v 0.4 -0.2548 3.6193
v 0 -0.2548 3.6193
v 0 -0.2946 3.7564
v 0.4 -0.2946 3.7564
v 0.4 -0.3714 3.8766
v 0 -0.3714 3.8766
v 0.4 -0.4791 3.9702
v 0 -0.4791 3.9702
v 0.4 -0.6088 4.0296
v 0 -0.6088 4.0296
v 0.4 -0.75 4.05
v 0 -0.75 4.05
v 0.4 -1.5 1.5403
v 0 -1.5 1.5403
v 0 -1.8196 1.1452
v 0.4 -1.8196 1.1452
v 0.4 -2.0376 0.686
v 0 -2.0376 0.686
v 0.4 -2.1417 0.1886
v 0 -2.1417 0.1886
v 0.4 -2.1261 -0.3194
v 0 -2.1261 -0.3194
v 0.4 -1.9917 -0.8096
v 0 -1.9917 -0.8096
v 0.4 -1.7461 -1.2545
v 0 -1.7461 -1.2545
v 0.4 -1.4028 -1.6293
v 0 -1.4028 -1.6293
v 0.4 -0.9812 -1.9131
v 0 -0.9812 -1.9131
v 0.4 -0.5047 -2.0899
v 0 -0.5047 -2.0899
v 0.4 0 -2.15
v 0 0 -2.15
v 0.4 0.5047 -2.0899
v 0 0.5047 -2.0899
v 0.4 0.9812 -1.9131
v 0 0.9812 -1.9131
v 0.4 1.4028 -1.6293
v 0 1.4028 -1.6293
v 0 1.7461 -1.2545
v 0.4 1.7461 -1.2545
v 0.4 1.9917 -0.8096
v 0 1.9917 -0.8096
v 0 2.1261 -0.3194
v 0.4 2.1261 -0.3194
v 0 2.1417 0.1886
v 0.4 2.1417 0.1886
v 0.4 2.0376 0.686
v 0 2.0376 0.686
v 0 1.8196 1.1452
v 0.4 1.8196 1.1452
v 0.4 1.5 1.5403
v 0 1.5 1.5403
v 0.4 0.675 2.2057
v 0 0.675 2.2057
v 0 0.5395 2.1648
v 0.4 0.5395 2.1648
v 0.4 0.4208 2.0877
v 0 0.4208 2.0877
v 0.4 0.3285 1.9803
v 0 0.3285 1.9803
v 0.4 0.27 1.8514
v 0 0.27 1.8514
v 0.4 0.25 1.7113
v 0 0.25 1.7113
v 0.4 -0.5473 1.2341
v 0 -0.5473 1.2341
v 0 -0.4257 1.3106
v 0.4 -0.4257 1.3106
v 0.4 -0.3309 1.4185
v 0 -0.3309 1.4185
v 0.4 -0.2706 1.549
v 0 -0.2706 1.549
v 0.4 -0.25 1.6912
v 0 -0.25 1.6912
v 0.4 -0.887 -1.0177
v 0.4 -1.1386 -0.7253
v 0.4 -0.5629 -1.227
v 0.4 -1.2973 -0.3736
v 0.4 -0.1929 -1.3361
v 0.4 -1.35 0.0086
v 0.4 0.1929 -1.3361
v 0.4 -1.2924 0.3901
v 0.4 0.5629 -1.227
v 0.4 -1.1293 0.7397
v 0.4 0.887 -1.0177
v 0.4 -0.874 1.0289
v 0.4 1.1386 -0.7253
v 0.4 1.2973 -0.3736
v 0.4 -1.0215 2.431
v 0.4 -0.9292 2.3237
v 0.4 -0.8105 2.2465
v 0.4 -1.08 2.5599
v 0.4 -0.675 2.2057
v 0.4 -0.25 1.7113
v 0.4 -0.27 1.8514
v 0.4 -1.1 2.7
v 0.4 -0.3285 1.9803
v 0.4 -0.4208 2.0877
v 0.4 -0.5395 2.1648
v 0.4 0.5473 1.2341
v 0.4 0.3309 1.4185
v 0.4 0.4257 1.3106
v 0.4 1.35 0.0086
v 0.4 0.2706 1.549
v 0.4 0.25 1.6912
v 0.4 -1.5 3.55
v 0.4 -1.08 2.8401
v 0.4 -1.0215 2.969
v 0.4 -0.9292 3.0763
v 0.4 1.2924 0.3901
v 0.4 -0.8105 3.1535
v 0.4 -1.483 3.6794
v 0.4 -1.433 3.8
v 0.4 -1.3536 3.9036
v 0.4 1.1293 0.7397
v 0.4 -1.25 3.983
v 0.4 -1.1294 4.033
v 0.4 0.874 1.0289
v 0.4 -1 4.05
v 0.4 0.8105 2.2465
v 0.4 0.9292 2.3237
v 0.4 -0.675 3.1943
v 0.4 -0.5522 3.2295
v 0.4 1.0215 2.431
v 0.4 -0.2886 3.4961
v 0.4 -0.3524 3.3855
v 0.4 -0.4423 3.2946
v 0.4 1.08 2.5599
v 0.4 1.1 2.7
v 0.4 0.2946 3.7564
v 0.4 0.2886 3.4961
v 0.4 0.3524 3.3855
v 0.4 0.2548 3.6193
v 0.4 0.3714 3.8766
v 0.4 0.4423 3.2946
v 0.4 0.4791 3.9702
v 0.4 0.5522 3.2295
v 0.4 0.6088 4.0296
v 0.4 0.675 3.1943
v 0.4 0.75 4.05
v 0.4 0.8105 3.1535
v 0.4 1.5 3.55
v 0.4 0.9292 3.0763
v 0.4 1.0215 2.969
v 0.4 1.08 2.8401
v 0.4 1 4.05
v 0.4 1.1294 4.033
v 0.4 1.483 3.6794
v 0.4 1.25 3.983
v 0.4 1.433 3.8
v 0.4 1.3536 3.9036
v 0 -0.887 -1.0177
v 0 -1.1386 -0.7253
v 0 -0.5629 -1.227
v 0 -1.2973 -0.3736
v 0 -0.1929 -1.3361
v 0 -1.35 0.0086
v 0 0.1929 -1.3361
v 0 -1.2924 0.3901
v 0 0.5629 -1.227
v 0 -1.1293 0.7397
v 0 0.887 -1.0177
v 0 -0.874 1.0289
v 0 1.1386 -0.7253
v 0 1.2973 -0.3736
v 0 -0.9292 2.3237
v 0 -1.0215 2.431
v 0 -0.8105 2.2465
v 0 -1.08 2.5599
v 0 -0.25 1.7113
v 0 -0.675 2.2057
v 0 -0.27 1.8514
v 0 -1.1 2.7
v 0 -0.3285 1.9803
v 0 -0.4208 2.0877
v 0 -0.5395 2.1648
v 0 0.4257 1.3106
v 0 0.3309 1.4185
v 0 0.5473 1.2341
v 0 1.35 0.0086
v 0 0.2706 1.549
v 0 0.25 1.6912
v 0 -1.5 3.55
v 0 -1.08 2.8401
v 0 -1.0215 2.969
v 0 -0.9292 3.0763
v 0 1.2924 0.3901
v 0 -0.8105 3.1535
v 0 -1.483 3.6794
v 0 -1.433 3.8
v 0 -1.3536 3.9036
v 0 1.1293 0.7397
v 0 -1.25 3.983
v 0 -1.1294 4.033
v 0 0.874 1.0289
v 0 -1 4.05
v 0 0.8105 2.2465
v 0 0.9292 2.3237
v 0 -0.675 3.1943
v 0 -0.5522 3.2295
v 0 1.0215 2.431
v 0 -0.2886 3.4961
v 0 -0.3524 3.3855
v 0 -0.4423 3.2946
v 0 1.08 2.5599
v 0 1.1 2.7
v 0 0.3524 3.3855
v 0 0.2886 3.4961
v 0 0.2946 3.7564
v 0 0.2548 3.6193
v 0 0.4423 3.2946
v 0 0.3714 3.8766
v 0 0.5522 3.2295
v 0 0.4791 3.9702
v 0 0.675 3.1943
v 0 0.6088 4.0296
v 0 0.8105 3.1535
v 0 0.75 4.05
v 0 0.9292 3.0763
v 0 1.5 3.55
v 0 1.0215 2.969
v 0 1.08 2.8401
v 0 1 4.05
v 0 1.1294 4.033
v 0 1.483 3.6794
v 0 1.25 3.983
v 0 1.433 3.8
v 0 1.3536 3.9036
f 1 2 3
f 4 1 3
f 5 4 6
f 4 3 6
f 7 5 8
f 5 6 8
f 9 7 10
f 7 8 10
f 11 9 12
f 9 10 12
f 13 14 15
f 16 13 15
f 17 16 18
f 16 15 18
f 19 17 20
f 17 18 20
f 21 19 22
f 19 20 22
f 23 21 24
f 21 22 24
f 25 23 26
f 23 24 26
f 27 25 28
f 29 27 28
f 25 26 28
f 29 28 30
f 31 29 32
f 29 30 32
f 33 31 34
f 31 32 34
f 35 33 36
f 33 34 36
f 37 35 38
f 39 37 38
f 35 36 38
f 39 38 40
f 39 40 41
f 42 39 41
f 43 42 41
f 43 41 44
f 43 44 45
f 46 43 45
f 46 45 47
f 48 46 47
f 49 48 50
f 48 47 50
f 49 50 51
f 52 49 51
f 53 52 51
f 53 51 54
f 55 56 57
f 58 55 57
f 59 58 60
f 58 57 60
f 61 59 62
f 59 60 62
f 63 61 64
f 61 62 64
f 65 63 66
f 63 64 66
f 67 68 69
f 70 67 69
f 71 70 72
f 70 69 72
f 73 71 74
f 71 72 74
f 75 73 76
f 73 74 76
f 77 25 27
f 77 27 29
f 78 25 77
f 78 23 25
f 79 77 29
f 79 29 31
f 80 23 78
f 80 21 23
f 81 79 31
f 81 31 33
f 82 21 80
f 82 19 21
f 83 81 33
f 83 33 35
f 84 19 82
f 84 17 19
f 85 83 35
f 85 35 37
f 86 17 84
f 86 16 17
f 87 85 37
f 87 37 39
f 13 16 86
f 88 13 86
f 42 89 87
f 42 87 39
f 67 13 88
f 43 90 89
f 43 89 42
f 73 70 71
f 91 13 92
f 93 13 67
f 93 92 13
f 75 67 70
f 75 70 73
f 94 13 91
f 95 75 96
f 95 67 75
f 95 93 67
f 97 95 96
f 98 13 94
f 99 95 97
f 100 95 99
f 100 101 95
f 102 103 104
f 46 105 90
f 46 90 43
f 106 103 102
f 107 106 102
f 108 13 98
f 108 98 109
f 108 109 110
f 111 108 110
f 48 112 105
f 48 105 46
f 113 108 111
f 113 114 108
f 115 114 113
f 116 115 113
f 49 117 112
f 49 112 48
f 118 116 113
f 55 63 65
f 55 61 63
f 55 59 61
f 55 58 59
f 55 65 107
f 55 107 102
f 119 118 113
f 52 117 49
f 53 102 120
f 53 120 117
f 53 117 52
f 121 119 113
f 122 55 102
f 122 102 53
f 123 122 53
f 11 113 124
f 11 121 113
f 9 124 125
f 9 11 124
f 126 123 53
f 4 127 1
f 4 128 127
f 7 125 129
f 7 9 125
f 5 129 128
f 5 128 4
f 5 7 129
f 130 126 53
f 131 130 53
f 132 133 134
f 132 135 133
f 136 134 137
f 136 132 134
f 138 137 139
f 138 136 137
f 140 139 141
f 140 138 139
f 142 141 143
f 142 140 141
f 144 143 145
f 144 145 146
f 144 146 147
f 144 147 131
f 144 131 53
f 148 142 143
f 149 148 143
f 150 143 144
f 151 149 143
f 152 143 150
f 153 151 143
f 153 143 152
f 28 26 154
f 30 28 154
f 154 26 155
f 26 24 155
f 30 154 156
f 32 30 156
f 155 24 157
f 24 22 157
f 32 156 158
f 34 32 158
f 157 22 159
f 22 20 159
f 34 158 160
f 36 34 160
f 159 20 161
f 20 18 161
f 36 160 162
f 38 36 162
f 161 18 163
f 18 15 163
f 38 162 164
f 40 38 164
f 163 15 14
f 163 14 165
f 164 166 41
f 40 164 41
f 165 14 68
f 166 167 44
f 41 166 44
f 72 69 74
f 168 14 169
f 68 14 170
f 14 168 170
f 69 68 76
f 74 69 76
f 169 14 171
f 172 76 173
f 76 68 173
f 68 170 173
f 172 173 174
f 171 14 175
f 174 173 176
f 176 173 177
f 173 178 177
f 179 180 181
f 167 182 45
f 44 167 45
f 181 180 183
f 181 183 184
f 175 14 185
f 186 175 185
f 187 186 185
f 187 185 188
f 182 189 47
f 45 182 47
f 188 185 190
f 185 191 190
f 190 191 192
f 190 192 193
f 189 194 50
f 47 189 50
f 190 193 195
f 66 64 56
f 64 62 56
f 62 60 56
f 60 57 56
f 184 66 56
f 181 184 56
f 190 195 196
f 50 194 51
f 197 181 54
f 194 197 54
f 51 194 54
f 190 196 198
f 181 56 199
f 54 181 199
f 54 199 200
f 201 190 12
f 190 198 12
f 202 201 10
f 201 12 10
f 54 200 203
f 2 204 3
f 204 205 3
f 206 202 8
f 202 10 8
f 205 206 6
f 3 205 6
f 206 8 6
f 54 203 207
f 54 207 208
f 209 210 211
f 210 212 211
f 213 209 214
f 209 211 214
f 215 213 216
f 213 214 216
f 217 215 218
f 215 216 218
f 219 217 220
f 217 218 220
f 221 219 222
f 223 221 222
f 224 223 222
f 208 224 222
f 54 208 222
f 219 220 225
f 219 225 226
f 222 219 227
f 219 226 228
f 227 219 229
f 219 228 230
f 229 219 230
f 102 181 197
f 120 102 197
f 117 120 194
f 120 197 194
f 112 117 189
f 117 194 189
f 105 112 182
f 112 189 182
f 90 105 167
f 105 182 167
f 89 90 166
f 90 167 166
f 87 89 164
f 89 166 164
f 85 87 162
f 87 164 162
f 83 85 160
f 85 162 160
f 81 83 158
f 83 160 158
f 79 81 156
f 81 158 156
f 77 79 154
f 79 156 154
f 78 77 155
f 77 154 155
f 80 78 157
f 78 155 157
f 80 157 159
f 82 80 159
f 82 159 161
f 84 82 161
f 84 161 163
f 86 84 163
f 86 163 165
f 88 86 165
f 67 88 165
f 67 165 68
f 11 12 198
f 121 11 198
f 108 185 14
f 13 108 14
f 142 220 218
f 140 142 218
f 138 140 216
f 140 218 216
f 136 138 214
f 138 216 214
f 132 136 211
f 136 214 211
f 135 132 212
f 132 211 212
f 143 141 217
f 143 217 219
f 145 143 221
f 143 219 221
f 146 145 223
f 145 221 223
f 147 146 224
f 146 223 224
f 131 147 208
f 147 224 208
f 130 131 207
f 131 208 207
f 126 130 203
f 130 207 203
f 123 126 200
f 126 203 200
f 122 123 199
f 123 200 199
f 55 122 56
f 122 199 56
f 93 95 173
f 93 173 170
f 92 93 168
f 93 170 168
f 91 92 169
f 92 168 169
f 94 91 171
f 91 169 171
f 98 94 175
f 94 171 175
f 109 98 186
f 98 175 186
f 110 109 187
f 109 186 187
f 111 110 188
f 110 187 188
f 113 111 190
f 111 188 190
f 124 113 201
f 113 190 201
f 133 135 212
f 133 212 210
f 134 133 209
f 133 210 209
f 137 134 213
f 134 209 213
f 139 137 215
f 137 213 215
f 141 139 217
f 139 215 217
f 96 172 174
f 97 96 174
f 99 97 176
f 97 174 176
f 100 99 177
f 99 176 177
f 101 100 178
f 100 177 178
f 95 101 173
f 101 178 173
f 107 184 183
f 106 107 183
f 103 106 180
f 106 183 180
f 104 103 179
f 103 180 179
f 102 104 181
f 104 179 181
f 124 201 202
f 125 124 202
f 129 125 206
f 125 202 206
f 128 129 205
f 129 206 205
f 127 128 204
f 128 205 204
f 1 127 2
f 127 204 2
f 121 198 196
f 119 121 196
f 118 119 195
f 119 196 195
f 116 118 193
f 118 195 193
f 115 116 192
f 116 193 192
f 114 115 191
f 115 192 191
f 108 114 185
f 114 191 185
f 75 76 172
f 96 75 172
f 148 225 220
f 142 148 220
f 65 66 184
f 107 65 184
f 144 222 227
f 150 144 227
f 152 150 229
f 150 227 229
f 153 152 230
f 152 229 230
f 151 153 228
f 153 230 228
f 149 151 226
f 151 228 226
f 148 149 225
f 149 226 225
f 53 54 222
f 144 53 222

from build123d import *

# Parameters (mm, degrees)
F1_DEPTH    = 0.4
F2_T1_DEPTH = 2.9
F2_T3_DEPTH = 2.8434299833
F2_T5_DEPTH = 2.2225176819


# Not quite as in the source:
# - a fillet or chamfer that OpenCascade refuses, or shapes differently, is made with other operations: its cross-section is extruded or revolved along the edge and cut away or added


with BuildPart() as f1:
    # F0 (on Right) → F1 (new body)
    with BuildSketch(Plane.YZ):
        with BuildLine():
            ThreePointArc((0.25, 1.3266499161), (0, -1.35), (-0.25, 1.3266499161))
            Line((-0.25, 1.3266499161), (-0.25, 2.2))
            Line((-0.25, 2.2), (-0.6, 2.2))
            ThreePointArc((-0.6, 2.2), (-1.1, 2.7), (-0.6, 3.2))
            Line((-0.6, 3.2), (-0.25, 3.2))
            Line((-0.25, 3.2), (-0.25, 4.05))
            Line((-0.25, 4.05), (-1.5, 4.05))
            Line((-1.5, 4.05), (-1.5, 1.5402921801))
            ThreePointArc((-1.5, 1.5402921801), (0, -2.15), (1.5, 1.5402921801))
            Line((1.5, 1.5402921801), (1.5, 4.05))
            Line((1.5, 4.05), (0.25, 4.05))
            Line((0.25, 4.05), (0.25, 3.2))
            Line((0.25, 3.2), (0.6, 3.2))
            ThreePointArc((0.6, 3.2), (1.1, 2.7), (0.6, 2.2))
            Line((0.6, 2.2), (0.25, 2.2))
            Line((0.25, 2.2), (0.25, 1.3266499161))
        make_face()
    extrude(amount=F1_DEPTH)

    # F2: fillet of radius 0.5 on 10 edges, made by hand

    # F2_s2 → F2_t1 (cut)
    with BuildSketch(Plane.YZ.offset(-1.25)):
        with BuildLine():
            ThreePointArc((-0.25, 3.55), (-0.3964466094, 3.9035533906), (-0.75, 4.05))
            Line((-0.75, 4.05), (-0.25, 4.05))
            Line((-0.25, 4.05), (-0.25, 3.55))
        make_face()
        with BuildLine():
            ThreePointArc((-1, 4.05), (-1.3535533906, 3.9035533906), (-1.5, 3.55))
            Line((-1.5, 3.55), (-1.5, 4.05))
            Line((-1.5, 4.05), (-1, 4.05))
        make_face()
        with BuildLine():
            ThreePointArc((0.75, 4.05), (0.3964466094, 3.9035533906), (0.25, 3.55))
            Line((0.25, 3.55), (0.25, 4.05))
            Line((0.25, 4.05), (0.75, 4.05))
        make_face()
        with BuildLine():
            ThreePointArc((1.5, 3.55), (1.3535533906, 3.9035533906), (1, 4.05))
            Line((1, 4.05), (1.5, 4.05))
            Line((1.5, 4.05), (1.5, 3.55))
        make_face()
    extrude(amount=F2_T1_DEPTH, mode=Mode.SUBTRACT)

    # F2_s4 → F2_t3 (cut)
    with BuildSketch(Plane.YZ.offset(-1.2217149917)):
        with BuildLine():
            ThreePointArc((-0.675, 3.1943429983), (-0.3708562278, 3.3627258764), (-0.25, 3.6886859967))
            Line((-0.25, 3.6886859967), (-0.2, 3.6886859967))
            Line((-0.2, 3.6886859967), (-0.2, 3.2))
            Line((-0.2, 3.2), (-0.25, 3.15))
            ThreePointArc((-0.25, 3.15), (-0.6, 3.15), (-0.6675, 3.1449086985))
            Line((-0.6675, 3.1449086985), (-0.675, 3.1943429983))
        make_face()
        with BuildLine():
            ThreePointArc((-0.25, 1.7113140033), (-0.3708562278, 2.0372741236), (-0.675, 2.2056570017))
            Line((-0.675, 2.2056570017), (-0.6675, 2.2550913015))
            ThreePointArc((-0.6675, 2.2550913015), (-0.6, 2.25), (-0.25, 2.25))
            Line((-0.25, 2.25), (-0.2, 2.2))
            Line((-0.2, 2.2), (-0.2, 1.7113140033))
            Line((-0.2, 1.7113140033), (-0.25, 1.7113140033))
        make_face()
        with BuildLine():
            ThreePointArc((0.675, 2.2056570017), (0.3708562278, 2.0372741236), (0.25, 1.7113140033))
            Line((0.25, 1.7113140033), (0.2, 1.7113140033))
            Line((0.2, 1.7113140033), (0.2, 2.2))
            Line((0.2, 2.2), (0.25, 2.25))
            ThreePointArc((0.25, 2.25), (0.6, 2.25), (0.6675, 2.2550913015))
            Line((0.6675, 2.2550913015), (0.675, 2.2056570017))
        make_face()
        with BuildLine():
            ThreePointArc((0.25, 3.6886859967), (0.3708562278, 3.3627258764), (0.675, 3.1943429983))
            Line((0.675, 3.1943429983), (0.6675, 3.1449086985))
            ThreePointArc((0.6675, 3.1449086985), (0.6, 3.15), (0.25, 3.15))
            Line((0.25, 3.15), (0.2, 3.2))
            Line((0.2, 3.2), (0.2, 3.6886859967))
            Line((0.2, 3.6886859967), (0.25, 3.6886859967))
        make_face()
    extrude(amount=F2_T3_DEPTH, mode=Mode.SUBTRACT)

    # F2_s6 → F2_t5 (cut)
    with BuildSketch(Plane.YZ.offset(-0.911258841)):
        with BuildLine():
            ThreePointArc((0.25, 1.6911534525), (0.3308631779, 1.4185285741), (0.5472972973, 1.2340849518))
            ThreePointArc((0.5472972973, 1.2340849518), (0.4013263176, 1.2889674886), (0.25, 1.3266499161))
            Line((0.25, 1.3266499161), (0.25, 1.6911534525))
        make_face()
        with BuildLine():
            ThreePointArc((-0.5472972973, 1.2340849518), (-0.3308631779, 1.4185285741), (-0.25, 1.6911534525))
            Line((-0.25, 1.6911534525), (-0.25, 1.3266499161))
            ThreePointArc((-0.25, 1.3266499161), (-0.4013263176, 1.2889674886), (-0.5472972973, 1.2340849518))
        make_face()
    extrude(amount=F2_T5_DEPTH, mode=Mode.SUBTRACT)


solid = f1.part
